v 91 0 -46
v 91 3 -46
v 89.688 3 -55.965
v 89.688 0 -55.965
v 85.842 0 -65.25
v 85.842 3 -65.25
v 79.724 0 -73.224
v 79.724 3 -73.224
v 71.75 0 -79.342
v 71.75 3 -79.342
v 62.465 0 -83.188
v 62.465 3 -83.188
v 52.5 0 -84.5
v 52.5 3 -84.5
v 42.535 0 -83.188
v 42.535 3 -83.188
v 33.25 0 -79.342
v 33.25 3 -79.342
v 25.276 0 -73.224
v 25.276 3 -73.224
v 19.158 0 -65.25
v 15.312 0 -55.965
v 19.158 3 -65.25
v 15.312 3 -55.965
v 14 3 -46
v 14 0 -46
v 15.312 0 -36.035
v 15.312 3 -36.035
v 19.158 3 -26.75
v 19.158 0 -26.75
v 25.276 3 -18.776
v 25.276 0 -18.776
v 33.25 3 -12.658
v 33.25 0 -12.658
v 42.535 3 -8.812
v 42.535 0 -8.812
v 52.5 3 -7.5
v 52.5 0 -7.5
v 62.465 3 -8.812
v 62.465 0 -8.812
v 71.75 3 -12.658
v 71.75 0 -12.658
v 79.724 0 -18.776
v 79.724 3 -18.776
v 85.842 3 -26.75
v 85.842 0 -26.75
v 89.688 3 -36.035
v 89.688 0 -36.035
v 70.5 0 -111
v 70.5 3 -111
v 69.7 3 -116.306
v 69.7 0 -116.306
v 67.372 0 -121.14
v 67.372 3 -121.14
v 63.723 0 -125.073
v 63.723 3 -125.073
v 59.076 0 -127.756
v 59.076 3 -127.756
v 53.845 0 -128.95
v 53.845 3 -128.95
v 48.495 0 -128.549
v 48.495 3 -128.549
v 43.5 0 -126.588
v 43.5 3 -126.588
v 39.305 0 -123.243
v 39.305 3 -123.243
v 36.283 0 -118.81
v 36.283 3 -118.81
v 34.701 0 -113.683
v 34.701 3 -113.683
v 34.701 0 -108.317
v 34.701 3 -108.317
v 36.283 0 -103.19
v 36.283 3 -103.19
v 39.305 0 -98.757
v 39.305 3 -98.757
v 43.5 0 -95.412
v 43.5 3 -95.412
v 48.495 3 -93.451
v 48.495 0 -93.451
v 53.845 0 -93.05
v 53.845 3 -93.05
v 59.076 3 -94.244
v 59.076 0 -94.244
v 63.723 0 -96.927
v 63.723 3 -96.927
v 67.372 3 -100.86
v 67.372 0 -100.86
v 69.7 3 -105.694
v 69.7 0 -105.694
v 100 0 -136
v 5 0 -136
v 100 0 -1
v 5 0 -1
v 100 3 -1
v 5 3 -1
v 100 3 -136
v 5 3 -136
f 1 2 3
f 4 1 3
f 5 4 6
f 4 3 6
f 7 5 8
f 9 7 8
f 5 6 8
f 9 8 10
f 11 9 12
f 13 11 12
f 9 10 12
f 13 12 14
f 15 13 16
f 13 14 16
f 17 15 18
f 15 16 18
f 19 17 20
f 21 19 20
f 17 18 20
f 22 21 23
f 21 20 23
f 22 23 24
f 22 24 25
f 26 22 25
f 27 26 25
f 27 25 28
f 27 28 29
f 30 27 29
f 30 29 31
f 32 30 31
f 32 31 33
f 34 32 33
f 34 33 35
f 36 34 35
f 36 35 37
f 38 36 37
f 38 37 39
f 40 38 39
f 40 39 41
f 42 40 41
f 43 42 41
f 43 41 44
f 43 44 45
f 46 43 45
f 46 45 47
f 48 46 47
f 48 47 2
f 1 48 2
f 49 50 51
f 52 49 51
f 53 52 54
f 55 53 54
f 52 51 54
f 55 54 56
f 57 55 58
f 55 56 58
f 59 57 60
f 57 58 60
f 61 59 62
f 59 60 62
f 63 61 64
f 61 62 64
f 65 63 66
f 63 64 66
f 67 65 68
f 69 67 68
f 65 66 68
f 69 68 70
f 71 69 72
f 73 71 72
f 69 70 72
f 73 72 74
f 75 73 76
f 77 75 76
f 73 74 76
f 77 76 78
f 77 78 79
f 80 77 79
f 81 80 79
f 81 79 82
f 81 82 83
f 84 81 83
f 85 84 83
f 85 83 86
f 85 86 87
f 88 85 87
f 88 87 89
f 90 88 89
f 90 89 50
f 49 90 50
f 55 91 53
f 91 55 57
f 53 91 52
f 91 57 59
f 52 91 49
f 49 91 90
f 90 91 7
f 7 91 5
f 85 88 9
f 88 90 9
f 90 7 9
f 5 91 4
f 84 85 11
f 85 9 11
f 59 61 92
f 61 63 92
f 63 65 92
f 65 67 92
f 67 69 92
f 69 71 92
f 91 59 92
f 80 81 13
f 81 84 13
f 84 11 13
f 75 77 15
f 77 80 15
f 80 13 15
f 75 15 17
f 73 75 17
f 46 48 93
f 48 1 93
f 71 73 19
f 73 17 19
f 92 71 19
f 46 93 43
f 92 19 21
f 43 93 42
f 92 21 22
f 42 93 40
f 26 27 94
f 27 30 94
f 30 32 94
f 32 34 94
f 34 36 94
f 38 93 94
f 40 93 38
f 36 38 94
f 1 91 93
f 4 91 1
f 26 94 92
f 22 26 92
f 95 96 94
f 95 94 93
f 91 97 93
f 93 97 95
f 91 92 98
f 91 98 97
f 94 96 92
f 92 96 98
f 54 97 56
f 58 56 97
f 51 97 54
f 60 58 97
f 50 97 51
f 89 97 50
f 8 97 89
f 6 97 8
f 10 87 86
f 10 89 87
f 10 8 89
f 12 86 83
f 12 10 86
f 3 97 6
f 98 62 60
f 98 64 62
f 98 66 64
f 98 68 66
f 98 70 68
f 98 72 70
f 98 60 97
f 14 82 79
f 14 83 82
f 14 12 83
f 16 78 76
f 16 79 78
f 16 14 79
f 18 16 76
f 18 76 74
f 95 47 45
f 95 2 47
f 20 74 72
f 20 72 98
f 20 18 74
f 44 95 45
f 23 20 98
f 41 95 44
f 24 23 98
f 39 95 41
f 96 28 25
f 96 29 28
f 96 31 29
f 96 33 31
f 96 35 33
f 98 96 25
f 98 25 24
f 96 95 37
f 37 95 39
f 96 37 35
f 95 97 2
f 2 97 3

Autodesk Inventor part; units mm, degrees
ref_plane "YZ Plane" through (0, 0, 0) normal (1, 0, 0) x (0, 1, 0)
ref_plane "XZ Plane" through (0, 0, 0) normal (0, 1, 0) x (-1, 0, 0)
ref_plane "XY Plane" through (0, 0, 0) normal (0, 0, 1) x (1, 0, 0)
sketch "Boceto1" plane through (0, 0, 0) normal (0, 1, 0) x (-1, 0, 0)
  line L0 (0, 0) -> (-105, 0)
  line L1 (-105, 0) -> (-105, -140)
  line L2 (-105, -140) -> (0, -140)
  line L3 (0, -140) -> (0, 0)
  dimension "d0" = 105
  dimension "d1" = 140
extrude "Extrusión1" add sketch "Boceto1" along normal blind 3
sketch "Boceto2" plane through (0, 3, 0) normal (0, 1, 0) x (1, 0, 0)
  line L0 (0, 0) -> (105, 0) projected
  line L1 (105, 0) -> (105, 140) projected
  line L2 (105, 140) -> (0, 140) projected
  line L3 (0, 140) -> (0, 0) projected
  circle A0 centre (52.5, 46) radius 38.5
  circle A1 centre (52.5, 111) radius 18
  dimension "d4" = 77
  dimension "d5" = 46
  dimension "d6" = 52.5
  dimension "d7" = 36
  dimension "d8" = 52.5
  dimension "d13" = 65
extrude "Extrusión2" cut sketch "Boceto2" against normal blind 3 contours A0 | A1
sketch "Boceto3" plane through (0, 0, 0) normal (0, -1, 0) x (1, 0, 0)
  circle A0 centre (52.5, -111) radius 18 projected
  circle A1 centre (52.5, -46) radius 38.5 projected
  line L0 (0, 0) -> (105, 0) projected
  line L1 (0, -140) -> (0, 0) projected
  line L2 (105, -140) -> (0, -140) projected
  line L3 (105, 0) -> (105, -140) projected
  line L4 (105, -140) -> (0, -140) projected
  line L5 (0, -140) -> (0, 0) projected
  line L6 (105, -140) -> (0, -140)
  line L7 (0, -140) -> (0, -136)
  line L8 (0, -136) -> (105, -136)
  line L9 (105, -136) -> (105, -140)
  dimension "d14" = 4
extrude "Extrusión3" cut sketch "Boceto3" against normal blind 3 contours L8 L3 L2 L1
sketch "Boceto4" plane through (0, 0, 0) normal (0, -1, 0) x (1, 0, 0)
  line L0 (0, -136) -> (105, -136) projected
  line L1 (105, 0) -> (105, -136) projected
  line L2 (0, 0) -> (105, 0) projected
  line L3 (0, -136) -> (0, 0) projected
  circle A0 centre (52.5, -111) radius 18 projected
  circle A1 centre (52.5, -46) radius 38.5 projected
  line L4 (105, -136) -> (0, -136) projected
  line L5 (2.5, 0) -> (102.5, 0)
  line L6 (102.5, 0) -> (102.5, -136)
  line L7 (102.5, -136) -> (2.5, -136)
  line L8 (2.5, -136) -> (2.5, 0)
  line L9 (2.5, 0) -> (102.5, -136) construction
  line L10 (102.5, 0) -> (2.5, -136) construction
  point P0 (52.5, -68)
  dimension "d17" = 100
extrude "Extrusión4" cut sketch "Boceto4" against normal blind 3 contours L3 L2 L8 L0 | L6 L2 L1 L0
sketch "Boceto5" plane through (0, 3, 0) normal (0, 1, 0) x (1, 0, 0)
  point P0 (0, 0)
sketch "Boceto6" plane through (2.5, 0, 0) normal (0, 0, 1) x (1, 0, 0)
  line L0 (0, 3) -> (0, 0) projected
  line L1 (0, 0) -> (100, 0) projected
  line L2 (100, 0) -> (100, 3) projected
  line L3 (0, 3) -> (100, 3) projected
  point P0 (-2.5, 0)
extrude "Extrusión5" cut sketch "Boceto6" against normal blind 1
sketch "Boceto7" plane through (0, 3, 0) normal (0, 1, 0) x (1, 0, 0)
  line L0 (2.5, 1) -> (102.5, 1) projected
  line L1 (102.5, 1) -> (102.5, 136) projected
  line L2 (102.5, 136) -> (2.5, 136) projected
  line L3 (2.5, 136) -> (2.5, 1) projected
  circle A0 centre (52.5, 46) radius 38.5 projected
  circle A1 centre (52.5, 111) radius 18 projected
  line L4 (102.5, 136) -> (2.5, 136) projected
  line L5 (100, 1) -> (5, 1)
  line L6 (5, 1) -> (5, 136)
  line L7 (5, 136) -> (100, 136)
  line L8 (100, 136) -> (100, 1)
  line L9 (100, 1) -> (5, 136) construction
  line L10 (5, 1) -> (100, 136) construction
  point P0 (0, 0)
  point P1 (52.5, 68.5)
  dimension "d22" = 95
extrude "Extrusión6" cut sketch "Boceto7" against normal blind 3 contours L3 L2 L6 L0 | L8 L2 L1 L0
equation "\"d8\" = d6"
properties part number "frontal"
